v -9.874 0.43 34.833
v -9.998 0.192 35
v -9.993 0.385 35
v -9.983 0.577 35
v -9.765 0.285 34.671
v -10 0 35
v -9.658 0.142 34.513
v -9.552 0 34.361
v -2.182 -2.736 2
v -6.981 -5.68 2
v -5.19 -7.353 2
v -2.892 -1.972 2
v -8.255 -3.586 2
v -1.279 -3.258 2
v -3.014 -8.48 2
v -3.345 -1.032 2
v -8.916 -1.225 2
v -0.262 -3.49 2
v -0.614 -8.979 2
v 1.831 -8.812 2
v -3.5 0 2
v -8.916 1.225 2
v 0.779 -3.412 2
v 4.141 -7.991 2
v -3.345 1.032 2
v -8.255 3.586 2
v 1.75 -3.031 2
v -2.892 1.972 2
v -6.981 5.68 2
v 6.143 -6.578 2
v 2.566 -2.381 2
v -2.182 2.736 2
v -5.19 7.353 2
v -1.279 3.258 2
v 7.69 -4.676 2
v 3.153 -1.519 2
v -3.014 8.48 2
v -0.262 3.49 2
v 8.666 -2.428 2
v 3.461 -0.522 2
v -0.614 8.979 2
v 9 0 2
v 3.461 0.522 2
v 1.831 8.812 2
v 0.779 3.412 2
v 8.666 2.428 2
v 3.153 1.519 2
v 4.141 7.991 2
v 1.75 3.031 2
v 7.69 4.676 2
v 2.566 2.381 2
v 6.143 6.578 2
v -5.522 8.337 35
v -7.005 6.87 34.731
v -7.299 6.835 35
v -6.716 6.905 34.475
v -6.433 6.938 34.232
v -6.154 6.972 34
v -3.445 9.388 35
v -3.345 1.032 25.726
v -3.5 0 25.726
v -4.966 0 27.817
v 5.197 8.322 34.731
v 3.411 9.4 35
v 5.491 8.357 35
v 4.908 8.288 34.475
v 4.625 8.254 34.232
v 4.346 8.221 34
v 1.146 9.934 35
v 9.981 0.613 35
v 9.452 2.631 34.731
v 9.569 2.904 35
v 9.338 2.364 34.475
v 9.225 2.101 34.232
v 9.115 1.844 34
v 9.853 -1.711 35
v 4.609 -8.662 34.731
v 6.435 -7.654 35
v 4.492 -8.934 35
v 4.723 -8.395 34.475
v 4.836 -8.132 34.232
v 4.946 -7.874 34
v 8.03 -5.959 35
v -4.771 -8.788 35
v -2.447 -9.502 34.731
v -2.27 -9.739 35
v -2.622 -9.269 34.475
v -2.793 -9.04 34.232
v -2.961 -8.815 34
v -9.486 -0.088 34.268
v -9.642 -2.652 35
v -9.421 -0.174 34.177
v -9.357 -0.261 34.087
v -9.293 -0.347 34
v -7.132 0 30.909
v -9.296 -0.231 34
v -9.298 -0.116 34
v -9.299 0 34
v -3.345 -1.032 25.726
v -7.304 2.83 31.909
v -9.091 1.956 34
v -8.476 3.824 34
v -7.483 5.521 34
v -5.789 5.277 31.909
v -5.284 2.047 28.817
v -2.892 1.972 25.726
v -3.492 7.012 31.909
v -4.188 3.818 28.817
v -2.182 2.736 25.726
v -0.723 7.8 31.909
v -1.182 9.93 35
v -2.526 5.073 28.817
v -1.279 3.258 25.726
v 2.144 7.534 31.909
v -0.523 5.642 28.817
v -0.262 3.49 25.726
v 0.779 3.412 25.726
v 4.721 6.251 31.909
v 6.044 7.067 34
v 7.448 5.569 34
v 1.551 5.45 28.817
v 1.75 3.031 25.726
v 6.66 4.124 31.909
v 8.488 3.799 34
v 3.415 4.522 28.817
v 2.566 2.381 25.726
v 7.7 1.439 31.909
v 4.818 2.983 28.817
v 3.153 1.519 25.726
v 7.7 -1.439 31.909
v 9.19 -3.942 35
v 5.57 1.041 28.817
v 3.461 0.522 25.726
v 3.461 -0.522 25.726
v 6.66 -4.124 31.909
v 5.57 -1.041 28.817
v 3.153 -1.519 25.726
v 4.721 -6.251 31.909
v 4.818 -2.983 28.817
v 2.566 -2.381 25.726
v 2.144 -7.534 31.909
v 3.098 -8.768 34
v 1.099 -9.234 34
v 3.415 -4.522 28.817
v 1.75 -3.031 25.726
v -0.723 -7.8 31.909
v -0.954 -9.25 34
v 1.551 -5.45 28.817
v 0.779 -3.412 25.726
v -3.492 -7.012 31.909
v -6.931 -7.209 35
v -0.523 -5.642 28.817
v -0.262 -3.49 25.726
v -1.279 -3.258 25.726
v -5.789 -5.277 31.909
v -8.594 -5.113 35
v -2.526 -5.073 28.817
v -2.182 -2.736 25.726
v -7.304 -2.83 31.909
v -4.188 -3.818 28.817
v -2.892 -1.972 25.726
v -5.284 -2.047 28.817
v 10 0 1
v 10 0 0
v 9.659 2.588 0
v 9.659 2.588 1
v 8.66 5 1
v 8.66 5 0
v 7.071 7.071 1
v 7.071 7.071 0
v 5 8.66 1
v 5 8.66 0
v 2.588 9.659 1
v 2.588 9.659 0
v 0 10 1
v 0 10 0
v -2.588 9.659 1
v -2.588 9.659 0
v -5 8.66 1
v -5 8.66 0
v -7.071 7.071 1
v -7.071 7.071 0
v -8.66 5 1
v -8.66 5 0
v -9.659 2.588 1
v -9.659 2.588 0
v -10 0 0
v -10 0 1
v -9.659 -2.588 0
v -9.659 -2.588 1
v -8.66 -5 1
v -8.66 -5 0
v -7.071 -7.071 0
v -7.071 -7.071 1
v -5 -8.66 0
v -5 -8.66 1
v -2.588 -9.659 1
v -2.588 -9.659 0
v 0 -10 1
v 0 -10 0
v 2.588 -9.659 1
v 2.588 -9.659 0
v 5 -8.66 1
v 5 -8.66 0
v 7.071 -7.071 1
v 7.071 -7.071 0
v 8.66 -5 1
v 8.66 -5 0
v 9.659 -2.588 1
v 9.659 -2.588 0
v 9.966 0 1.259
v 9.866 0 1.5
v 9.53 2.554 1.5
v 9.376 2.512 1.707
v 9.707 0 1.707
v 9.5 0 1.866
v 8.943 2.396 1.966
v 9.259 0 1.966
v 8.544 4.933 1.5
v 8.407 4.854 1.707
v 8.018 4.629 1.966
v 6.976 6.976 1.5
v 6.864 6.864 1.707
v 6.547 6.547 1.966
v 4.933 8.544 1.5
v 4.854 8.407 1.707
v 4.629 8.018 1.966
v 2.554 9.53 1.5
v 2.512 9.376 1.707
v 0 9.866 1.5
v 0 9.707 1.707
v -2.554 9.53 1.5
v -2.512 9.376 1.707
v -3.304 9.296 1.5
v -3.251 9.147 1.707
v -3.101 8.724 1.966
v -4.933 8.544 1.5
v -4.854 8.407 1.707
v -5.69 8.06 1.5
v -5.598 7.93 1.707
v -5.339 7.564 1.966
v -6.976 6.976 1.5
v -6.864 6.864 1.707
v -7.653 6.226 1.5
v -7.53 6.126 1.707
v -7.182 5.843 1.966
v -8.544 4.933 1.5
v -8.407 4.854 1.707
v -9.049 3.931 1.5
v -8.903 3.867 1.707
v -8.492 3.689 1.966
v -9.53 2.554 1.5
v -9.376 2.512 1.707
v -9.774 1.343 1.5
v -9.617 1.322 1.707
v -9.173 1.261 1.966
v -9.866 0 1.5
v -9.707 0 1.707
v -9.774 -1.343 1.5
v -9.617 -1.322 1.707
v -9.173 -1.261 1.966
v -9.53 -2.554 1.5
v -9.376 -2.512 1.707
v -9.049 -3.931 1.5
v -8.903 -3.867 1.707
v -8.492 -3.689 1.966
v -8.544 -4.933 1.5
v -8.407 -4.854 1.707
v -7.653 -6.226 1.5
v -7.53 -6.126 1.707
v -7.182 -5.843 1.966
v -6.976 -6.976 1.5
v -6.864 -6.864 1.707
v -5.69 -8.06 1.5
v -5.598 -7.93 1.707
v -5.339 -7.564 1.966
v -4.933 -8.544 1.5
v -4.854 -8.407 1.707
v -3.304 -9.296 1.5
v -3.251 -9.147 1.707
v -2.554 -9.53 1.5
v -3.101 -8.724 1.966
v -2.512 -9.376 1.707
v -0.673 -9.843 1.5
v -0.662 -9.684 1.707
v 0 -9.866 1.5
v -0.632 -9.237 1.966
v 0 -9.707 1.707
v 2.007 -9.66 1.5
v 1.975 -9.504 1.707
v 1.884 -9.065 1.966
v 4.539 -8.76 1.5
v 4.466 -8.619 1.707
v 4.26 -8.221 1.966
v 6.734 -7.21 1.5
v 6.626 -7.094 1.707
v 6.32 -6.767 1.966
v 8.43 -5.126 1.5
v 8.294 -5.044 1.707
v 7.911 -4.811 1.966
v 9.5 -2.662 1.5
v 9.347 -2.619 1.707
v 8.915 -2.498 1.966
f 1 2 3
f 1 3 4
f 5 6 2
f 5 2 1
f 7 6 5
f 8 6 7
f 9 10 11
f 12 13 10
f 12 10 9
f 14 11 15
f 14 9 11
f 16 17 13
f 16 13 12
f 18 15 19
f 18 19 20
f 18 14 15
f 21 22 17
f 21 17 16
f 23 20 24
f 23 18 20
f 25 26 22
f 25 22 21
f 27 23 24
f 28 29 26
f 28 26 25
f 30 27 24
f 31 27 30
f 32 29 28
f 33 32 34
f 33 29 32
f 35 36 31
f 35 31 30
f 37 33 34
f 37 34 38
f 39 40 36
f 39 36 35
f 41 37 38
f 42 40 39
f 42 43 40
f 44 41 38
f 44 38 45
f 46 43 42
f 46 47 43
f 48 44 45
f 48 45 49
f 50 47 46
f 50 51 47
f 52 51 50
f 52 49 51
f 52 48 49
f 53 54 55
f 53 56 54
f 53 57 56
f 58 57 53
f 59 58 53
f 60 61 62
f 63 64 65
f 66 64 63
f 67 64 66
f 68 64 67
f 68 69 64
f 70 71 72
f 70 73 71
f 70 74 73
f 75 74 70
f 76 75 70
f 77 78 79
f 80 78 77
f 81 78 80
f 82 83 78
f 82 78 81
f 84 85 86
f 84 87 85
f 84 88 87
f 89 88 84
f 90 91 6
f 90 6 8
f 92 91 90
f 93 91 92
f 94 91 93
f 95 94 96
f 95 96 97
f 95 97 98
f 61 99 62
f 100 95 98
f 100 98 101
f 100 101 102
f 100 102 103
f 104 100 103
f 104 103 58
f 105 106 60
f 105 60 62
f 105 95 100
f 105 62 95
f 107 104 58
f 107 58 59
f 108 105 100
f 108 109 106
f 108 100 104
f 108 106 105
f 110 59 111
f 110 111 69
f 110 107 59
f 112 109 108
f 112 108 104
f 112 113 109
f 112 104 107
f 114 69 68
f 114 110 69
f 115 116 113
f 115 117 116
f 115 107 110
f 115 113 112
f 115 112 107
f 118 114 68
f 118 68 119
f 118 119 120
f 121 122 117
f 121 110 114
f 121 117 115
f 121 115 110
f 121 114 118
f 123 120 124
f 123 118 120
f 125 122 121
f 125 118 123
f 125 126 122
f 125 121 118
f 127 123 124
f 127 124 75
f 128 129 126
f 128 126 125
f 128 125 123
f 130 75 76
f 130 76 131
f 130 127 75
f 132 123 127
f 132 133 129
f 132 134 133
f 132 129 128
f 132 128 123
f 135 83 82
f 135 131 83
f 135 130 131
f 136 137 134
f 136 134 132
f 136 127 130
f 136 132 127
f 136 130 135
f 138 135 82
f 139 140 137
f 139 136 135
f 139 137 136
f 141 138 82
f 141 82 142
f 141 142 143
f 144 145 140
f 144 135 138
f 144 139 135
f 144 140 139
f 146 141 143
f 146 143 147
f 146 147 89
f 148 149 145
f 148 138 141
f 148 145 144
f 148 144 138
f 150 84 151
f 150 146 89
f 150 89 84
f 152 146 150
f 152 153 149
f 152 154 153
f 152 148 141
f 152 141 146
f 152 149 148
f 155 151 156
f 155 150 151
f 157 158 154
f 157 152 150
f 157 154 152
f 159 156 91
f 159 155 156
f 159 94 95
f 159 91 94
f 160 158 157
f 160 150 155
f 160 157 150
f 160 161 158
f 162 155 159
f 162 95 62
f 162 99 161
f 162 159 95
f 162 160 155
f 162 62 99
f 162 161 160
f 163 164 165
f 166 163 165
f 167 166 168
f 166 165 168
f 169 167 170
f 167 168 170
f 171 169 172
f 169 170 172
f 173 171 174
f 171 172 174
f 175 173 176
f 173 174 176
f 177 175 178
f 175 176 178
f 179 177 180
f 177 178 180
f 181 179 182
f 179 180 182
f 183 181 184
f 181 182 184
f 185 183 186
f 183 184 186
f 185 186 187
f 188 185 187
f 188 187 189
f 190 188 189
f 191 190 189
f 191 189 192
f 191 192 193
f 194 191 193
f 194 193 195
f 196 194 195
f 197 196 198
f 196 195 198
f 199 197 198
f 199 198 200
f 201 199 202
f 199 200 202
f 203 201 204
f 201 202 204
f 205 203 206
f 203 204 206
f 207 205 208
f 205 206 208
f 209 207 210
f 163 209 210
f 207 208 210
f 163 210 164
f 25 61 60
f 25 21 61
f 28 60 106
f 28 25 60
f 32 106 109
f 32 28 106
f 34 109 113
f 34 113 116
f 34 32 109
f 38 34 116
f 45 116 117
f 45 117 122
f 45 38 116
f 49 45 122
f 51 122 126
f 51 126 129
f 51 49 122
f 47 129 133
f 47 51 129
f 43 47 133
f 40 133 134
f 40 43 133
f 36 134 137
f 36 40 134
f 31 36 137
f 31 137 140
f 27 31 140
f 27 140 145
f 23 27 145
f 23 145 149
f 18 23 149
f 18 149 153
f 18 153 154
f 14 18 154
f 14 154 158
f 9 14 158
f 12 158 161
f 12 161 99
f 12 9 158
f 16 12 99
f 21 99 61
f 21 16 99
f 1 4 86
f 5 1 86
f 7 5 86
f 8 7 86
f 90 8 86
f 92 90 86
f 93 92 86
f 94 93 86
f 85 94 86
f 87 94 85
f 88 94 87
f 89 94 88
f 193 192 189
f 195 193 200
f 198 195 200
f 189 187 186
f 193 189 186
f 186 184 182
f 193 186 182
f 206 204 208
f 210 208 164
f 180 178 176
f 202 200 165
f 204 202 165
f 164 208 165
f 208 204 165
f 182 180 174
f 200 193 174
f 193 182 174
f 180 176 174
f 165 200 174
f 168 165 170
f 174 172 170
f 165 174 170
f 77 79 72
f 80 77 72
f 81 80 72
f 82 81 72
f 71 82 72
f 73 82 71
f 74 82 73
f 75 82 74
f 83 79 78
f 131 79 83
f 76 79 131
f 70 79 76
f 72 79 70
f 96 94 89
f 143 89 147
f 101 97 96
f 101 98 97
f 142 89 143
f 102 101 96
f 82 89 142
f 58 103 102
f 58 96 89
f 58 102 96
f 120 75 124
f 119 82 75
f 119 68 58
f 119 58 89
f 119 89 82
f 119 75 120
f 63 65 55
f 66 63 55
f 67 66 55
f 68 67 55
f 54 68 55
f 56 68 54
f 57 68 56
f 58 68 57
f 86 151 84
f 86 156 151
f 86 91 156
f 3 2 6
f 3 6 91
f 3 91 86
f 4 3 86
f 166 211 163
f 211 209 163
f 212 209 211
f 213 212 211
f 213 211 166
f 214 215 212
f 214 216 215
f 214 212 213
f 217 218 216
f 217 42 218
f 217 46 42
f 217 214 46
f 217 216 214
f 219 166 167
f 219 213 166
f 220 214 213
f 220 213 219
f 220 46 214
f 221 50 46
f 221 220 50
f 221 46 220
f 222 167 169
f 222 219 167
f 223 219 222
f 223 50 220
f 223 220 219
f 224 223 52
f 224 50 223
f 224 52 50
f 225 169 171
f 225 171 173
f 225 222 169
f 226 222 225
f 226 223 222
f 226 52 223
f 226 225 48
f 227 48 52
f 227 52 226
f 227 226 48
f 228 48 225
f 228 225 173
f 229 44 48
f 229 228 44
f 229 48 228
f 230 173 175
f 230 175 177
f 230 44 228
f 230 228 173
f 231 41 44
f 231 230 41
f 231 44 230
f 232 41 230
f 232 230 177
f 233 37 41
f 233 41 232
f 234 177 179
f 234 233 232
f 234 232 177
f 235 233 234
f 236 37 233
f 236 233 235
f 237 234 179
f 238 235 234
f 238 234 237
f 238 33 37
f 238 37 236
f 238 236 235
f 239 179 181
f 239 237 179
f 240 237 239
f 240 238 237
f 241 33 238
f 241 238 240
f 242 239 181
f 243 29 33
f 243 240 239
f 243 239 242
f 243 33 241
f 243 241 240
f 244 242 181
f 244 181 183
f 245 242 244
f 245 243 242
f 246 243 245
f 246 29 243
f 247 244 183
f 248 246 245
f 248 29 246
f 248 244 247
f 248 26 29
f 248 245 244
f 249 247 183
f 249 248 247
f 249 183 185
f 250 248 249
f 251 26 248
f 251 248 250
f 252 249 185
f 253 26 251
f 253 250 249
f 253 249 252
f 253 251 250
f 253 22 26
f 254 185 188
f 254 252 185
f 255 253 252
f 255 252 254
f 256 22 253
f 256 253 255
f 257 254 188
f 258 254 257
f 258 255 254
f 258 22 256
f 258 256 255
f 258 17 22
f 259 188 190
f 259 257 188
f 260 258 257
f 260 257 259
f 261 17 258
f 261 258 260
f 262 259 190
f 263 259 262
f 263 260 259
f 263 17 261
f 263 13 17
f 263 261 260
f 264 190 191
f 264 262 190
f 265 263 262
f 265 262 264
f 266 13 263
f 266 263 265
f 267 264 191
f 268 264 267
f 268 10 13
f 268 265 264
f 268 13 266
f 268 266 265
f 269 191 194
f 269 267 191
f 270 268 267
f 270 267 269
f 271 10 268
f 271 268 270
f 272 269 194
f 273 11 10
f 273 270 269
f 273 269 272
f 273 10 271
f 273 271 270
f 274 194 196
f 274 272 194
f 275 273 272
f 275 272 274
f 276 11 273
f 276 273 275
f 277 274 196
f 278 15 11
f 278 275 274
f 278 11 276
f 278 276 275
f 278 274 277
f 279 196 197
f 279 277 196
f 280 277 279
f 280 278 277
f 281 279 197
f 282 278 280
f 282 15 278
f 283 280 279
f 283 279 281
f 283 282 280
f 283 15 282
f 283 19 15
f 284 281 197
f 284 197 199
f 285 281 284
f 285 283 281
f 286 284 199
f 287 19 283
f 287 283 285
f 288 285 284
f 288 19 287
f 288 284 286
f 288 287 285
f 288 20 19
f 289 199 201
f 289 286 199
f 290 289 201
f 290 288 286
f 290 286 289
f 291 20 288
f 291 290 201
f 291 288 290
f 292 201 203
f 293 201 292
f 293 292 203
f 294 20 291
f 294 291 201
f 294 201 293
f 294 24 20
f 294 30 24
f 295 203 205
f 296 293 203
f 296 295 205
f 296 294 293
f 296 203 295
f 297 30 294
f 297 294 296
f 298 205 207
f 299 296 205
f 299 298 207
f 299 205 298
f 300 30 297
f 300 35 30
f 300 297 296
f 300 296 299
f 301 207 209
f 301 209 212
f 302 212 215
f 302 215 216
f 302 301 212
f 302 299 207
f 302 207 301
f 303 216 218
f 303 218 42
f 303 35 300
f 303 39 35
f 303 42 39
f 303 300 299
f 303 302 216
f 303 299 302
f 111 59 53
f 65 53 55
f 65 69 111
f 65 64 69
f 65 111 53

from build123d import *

# Parameters (mm, degrees)
F0_R     = 10
F1_DEPTH = 2
F3_R     = 1
F6_DEPTH = 1


with BuildPart() as f1:
    # F0 (on Top) → F1 (new body)
    with BuildSketch(Plane.XY):
        Circle(F0_R)
    extrude(amount=F1_DEPTH)

    # F3
    f3_edges = [f1.edges().sort_by_distance(p)[0] for p in [
        (-10, 0, 2),
    ]]
    fillet(f3_edges, radius=F3_R)

    # F2 (on Front) → F4 (revolve)
    with BuildSketch(Plane.XZ):
        Polygon((0, 35), (-10, 35), (-3.5, 25.7257949561), (-3.5, 2), (0, 2), align=None)
    revolve(axis=Axis((0, 0, 18.5), (0, 0, -1)))

    # F5 (on face) → F6 (cut)
    with BuildSketch(Plane.XY.offset(35)):
        Polygon((1.8076821121, -15.1926172437), (12.253351427, 9.1618072529), (-14.0610335391, 6.0308099908), align=None)
    extrude(amount=-F6_DEPTH, mode=Mode.SUBTRACT)


solid = f1.part
